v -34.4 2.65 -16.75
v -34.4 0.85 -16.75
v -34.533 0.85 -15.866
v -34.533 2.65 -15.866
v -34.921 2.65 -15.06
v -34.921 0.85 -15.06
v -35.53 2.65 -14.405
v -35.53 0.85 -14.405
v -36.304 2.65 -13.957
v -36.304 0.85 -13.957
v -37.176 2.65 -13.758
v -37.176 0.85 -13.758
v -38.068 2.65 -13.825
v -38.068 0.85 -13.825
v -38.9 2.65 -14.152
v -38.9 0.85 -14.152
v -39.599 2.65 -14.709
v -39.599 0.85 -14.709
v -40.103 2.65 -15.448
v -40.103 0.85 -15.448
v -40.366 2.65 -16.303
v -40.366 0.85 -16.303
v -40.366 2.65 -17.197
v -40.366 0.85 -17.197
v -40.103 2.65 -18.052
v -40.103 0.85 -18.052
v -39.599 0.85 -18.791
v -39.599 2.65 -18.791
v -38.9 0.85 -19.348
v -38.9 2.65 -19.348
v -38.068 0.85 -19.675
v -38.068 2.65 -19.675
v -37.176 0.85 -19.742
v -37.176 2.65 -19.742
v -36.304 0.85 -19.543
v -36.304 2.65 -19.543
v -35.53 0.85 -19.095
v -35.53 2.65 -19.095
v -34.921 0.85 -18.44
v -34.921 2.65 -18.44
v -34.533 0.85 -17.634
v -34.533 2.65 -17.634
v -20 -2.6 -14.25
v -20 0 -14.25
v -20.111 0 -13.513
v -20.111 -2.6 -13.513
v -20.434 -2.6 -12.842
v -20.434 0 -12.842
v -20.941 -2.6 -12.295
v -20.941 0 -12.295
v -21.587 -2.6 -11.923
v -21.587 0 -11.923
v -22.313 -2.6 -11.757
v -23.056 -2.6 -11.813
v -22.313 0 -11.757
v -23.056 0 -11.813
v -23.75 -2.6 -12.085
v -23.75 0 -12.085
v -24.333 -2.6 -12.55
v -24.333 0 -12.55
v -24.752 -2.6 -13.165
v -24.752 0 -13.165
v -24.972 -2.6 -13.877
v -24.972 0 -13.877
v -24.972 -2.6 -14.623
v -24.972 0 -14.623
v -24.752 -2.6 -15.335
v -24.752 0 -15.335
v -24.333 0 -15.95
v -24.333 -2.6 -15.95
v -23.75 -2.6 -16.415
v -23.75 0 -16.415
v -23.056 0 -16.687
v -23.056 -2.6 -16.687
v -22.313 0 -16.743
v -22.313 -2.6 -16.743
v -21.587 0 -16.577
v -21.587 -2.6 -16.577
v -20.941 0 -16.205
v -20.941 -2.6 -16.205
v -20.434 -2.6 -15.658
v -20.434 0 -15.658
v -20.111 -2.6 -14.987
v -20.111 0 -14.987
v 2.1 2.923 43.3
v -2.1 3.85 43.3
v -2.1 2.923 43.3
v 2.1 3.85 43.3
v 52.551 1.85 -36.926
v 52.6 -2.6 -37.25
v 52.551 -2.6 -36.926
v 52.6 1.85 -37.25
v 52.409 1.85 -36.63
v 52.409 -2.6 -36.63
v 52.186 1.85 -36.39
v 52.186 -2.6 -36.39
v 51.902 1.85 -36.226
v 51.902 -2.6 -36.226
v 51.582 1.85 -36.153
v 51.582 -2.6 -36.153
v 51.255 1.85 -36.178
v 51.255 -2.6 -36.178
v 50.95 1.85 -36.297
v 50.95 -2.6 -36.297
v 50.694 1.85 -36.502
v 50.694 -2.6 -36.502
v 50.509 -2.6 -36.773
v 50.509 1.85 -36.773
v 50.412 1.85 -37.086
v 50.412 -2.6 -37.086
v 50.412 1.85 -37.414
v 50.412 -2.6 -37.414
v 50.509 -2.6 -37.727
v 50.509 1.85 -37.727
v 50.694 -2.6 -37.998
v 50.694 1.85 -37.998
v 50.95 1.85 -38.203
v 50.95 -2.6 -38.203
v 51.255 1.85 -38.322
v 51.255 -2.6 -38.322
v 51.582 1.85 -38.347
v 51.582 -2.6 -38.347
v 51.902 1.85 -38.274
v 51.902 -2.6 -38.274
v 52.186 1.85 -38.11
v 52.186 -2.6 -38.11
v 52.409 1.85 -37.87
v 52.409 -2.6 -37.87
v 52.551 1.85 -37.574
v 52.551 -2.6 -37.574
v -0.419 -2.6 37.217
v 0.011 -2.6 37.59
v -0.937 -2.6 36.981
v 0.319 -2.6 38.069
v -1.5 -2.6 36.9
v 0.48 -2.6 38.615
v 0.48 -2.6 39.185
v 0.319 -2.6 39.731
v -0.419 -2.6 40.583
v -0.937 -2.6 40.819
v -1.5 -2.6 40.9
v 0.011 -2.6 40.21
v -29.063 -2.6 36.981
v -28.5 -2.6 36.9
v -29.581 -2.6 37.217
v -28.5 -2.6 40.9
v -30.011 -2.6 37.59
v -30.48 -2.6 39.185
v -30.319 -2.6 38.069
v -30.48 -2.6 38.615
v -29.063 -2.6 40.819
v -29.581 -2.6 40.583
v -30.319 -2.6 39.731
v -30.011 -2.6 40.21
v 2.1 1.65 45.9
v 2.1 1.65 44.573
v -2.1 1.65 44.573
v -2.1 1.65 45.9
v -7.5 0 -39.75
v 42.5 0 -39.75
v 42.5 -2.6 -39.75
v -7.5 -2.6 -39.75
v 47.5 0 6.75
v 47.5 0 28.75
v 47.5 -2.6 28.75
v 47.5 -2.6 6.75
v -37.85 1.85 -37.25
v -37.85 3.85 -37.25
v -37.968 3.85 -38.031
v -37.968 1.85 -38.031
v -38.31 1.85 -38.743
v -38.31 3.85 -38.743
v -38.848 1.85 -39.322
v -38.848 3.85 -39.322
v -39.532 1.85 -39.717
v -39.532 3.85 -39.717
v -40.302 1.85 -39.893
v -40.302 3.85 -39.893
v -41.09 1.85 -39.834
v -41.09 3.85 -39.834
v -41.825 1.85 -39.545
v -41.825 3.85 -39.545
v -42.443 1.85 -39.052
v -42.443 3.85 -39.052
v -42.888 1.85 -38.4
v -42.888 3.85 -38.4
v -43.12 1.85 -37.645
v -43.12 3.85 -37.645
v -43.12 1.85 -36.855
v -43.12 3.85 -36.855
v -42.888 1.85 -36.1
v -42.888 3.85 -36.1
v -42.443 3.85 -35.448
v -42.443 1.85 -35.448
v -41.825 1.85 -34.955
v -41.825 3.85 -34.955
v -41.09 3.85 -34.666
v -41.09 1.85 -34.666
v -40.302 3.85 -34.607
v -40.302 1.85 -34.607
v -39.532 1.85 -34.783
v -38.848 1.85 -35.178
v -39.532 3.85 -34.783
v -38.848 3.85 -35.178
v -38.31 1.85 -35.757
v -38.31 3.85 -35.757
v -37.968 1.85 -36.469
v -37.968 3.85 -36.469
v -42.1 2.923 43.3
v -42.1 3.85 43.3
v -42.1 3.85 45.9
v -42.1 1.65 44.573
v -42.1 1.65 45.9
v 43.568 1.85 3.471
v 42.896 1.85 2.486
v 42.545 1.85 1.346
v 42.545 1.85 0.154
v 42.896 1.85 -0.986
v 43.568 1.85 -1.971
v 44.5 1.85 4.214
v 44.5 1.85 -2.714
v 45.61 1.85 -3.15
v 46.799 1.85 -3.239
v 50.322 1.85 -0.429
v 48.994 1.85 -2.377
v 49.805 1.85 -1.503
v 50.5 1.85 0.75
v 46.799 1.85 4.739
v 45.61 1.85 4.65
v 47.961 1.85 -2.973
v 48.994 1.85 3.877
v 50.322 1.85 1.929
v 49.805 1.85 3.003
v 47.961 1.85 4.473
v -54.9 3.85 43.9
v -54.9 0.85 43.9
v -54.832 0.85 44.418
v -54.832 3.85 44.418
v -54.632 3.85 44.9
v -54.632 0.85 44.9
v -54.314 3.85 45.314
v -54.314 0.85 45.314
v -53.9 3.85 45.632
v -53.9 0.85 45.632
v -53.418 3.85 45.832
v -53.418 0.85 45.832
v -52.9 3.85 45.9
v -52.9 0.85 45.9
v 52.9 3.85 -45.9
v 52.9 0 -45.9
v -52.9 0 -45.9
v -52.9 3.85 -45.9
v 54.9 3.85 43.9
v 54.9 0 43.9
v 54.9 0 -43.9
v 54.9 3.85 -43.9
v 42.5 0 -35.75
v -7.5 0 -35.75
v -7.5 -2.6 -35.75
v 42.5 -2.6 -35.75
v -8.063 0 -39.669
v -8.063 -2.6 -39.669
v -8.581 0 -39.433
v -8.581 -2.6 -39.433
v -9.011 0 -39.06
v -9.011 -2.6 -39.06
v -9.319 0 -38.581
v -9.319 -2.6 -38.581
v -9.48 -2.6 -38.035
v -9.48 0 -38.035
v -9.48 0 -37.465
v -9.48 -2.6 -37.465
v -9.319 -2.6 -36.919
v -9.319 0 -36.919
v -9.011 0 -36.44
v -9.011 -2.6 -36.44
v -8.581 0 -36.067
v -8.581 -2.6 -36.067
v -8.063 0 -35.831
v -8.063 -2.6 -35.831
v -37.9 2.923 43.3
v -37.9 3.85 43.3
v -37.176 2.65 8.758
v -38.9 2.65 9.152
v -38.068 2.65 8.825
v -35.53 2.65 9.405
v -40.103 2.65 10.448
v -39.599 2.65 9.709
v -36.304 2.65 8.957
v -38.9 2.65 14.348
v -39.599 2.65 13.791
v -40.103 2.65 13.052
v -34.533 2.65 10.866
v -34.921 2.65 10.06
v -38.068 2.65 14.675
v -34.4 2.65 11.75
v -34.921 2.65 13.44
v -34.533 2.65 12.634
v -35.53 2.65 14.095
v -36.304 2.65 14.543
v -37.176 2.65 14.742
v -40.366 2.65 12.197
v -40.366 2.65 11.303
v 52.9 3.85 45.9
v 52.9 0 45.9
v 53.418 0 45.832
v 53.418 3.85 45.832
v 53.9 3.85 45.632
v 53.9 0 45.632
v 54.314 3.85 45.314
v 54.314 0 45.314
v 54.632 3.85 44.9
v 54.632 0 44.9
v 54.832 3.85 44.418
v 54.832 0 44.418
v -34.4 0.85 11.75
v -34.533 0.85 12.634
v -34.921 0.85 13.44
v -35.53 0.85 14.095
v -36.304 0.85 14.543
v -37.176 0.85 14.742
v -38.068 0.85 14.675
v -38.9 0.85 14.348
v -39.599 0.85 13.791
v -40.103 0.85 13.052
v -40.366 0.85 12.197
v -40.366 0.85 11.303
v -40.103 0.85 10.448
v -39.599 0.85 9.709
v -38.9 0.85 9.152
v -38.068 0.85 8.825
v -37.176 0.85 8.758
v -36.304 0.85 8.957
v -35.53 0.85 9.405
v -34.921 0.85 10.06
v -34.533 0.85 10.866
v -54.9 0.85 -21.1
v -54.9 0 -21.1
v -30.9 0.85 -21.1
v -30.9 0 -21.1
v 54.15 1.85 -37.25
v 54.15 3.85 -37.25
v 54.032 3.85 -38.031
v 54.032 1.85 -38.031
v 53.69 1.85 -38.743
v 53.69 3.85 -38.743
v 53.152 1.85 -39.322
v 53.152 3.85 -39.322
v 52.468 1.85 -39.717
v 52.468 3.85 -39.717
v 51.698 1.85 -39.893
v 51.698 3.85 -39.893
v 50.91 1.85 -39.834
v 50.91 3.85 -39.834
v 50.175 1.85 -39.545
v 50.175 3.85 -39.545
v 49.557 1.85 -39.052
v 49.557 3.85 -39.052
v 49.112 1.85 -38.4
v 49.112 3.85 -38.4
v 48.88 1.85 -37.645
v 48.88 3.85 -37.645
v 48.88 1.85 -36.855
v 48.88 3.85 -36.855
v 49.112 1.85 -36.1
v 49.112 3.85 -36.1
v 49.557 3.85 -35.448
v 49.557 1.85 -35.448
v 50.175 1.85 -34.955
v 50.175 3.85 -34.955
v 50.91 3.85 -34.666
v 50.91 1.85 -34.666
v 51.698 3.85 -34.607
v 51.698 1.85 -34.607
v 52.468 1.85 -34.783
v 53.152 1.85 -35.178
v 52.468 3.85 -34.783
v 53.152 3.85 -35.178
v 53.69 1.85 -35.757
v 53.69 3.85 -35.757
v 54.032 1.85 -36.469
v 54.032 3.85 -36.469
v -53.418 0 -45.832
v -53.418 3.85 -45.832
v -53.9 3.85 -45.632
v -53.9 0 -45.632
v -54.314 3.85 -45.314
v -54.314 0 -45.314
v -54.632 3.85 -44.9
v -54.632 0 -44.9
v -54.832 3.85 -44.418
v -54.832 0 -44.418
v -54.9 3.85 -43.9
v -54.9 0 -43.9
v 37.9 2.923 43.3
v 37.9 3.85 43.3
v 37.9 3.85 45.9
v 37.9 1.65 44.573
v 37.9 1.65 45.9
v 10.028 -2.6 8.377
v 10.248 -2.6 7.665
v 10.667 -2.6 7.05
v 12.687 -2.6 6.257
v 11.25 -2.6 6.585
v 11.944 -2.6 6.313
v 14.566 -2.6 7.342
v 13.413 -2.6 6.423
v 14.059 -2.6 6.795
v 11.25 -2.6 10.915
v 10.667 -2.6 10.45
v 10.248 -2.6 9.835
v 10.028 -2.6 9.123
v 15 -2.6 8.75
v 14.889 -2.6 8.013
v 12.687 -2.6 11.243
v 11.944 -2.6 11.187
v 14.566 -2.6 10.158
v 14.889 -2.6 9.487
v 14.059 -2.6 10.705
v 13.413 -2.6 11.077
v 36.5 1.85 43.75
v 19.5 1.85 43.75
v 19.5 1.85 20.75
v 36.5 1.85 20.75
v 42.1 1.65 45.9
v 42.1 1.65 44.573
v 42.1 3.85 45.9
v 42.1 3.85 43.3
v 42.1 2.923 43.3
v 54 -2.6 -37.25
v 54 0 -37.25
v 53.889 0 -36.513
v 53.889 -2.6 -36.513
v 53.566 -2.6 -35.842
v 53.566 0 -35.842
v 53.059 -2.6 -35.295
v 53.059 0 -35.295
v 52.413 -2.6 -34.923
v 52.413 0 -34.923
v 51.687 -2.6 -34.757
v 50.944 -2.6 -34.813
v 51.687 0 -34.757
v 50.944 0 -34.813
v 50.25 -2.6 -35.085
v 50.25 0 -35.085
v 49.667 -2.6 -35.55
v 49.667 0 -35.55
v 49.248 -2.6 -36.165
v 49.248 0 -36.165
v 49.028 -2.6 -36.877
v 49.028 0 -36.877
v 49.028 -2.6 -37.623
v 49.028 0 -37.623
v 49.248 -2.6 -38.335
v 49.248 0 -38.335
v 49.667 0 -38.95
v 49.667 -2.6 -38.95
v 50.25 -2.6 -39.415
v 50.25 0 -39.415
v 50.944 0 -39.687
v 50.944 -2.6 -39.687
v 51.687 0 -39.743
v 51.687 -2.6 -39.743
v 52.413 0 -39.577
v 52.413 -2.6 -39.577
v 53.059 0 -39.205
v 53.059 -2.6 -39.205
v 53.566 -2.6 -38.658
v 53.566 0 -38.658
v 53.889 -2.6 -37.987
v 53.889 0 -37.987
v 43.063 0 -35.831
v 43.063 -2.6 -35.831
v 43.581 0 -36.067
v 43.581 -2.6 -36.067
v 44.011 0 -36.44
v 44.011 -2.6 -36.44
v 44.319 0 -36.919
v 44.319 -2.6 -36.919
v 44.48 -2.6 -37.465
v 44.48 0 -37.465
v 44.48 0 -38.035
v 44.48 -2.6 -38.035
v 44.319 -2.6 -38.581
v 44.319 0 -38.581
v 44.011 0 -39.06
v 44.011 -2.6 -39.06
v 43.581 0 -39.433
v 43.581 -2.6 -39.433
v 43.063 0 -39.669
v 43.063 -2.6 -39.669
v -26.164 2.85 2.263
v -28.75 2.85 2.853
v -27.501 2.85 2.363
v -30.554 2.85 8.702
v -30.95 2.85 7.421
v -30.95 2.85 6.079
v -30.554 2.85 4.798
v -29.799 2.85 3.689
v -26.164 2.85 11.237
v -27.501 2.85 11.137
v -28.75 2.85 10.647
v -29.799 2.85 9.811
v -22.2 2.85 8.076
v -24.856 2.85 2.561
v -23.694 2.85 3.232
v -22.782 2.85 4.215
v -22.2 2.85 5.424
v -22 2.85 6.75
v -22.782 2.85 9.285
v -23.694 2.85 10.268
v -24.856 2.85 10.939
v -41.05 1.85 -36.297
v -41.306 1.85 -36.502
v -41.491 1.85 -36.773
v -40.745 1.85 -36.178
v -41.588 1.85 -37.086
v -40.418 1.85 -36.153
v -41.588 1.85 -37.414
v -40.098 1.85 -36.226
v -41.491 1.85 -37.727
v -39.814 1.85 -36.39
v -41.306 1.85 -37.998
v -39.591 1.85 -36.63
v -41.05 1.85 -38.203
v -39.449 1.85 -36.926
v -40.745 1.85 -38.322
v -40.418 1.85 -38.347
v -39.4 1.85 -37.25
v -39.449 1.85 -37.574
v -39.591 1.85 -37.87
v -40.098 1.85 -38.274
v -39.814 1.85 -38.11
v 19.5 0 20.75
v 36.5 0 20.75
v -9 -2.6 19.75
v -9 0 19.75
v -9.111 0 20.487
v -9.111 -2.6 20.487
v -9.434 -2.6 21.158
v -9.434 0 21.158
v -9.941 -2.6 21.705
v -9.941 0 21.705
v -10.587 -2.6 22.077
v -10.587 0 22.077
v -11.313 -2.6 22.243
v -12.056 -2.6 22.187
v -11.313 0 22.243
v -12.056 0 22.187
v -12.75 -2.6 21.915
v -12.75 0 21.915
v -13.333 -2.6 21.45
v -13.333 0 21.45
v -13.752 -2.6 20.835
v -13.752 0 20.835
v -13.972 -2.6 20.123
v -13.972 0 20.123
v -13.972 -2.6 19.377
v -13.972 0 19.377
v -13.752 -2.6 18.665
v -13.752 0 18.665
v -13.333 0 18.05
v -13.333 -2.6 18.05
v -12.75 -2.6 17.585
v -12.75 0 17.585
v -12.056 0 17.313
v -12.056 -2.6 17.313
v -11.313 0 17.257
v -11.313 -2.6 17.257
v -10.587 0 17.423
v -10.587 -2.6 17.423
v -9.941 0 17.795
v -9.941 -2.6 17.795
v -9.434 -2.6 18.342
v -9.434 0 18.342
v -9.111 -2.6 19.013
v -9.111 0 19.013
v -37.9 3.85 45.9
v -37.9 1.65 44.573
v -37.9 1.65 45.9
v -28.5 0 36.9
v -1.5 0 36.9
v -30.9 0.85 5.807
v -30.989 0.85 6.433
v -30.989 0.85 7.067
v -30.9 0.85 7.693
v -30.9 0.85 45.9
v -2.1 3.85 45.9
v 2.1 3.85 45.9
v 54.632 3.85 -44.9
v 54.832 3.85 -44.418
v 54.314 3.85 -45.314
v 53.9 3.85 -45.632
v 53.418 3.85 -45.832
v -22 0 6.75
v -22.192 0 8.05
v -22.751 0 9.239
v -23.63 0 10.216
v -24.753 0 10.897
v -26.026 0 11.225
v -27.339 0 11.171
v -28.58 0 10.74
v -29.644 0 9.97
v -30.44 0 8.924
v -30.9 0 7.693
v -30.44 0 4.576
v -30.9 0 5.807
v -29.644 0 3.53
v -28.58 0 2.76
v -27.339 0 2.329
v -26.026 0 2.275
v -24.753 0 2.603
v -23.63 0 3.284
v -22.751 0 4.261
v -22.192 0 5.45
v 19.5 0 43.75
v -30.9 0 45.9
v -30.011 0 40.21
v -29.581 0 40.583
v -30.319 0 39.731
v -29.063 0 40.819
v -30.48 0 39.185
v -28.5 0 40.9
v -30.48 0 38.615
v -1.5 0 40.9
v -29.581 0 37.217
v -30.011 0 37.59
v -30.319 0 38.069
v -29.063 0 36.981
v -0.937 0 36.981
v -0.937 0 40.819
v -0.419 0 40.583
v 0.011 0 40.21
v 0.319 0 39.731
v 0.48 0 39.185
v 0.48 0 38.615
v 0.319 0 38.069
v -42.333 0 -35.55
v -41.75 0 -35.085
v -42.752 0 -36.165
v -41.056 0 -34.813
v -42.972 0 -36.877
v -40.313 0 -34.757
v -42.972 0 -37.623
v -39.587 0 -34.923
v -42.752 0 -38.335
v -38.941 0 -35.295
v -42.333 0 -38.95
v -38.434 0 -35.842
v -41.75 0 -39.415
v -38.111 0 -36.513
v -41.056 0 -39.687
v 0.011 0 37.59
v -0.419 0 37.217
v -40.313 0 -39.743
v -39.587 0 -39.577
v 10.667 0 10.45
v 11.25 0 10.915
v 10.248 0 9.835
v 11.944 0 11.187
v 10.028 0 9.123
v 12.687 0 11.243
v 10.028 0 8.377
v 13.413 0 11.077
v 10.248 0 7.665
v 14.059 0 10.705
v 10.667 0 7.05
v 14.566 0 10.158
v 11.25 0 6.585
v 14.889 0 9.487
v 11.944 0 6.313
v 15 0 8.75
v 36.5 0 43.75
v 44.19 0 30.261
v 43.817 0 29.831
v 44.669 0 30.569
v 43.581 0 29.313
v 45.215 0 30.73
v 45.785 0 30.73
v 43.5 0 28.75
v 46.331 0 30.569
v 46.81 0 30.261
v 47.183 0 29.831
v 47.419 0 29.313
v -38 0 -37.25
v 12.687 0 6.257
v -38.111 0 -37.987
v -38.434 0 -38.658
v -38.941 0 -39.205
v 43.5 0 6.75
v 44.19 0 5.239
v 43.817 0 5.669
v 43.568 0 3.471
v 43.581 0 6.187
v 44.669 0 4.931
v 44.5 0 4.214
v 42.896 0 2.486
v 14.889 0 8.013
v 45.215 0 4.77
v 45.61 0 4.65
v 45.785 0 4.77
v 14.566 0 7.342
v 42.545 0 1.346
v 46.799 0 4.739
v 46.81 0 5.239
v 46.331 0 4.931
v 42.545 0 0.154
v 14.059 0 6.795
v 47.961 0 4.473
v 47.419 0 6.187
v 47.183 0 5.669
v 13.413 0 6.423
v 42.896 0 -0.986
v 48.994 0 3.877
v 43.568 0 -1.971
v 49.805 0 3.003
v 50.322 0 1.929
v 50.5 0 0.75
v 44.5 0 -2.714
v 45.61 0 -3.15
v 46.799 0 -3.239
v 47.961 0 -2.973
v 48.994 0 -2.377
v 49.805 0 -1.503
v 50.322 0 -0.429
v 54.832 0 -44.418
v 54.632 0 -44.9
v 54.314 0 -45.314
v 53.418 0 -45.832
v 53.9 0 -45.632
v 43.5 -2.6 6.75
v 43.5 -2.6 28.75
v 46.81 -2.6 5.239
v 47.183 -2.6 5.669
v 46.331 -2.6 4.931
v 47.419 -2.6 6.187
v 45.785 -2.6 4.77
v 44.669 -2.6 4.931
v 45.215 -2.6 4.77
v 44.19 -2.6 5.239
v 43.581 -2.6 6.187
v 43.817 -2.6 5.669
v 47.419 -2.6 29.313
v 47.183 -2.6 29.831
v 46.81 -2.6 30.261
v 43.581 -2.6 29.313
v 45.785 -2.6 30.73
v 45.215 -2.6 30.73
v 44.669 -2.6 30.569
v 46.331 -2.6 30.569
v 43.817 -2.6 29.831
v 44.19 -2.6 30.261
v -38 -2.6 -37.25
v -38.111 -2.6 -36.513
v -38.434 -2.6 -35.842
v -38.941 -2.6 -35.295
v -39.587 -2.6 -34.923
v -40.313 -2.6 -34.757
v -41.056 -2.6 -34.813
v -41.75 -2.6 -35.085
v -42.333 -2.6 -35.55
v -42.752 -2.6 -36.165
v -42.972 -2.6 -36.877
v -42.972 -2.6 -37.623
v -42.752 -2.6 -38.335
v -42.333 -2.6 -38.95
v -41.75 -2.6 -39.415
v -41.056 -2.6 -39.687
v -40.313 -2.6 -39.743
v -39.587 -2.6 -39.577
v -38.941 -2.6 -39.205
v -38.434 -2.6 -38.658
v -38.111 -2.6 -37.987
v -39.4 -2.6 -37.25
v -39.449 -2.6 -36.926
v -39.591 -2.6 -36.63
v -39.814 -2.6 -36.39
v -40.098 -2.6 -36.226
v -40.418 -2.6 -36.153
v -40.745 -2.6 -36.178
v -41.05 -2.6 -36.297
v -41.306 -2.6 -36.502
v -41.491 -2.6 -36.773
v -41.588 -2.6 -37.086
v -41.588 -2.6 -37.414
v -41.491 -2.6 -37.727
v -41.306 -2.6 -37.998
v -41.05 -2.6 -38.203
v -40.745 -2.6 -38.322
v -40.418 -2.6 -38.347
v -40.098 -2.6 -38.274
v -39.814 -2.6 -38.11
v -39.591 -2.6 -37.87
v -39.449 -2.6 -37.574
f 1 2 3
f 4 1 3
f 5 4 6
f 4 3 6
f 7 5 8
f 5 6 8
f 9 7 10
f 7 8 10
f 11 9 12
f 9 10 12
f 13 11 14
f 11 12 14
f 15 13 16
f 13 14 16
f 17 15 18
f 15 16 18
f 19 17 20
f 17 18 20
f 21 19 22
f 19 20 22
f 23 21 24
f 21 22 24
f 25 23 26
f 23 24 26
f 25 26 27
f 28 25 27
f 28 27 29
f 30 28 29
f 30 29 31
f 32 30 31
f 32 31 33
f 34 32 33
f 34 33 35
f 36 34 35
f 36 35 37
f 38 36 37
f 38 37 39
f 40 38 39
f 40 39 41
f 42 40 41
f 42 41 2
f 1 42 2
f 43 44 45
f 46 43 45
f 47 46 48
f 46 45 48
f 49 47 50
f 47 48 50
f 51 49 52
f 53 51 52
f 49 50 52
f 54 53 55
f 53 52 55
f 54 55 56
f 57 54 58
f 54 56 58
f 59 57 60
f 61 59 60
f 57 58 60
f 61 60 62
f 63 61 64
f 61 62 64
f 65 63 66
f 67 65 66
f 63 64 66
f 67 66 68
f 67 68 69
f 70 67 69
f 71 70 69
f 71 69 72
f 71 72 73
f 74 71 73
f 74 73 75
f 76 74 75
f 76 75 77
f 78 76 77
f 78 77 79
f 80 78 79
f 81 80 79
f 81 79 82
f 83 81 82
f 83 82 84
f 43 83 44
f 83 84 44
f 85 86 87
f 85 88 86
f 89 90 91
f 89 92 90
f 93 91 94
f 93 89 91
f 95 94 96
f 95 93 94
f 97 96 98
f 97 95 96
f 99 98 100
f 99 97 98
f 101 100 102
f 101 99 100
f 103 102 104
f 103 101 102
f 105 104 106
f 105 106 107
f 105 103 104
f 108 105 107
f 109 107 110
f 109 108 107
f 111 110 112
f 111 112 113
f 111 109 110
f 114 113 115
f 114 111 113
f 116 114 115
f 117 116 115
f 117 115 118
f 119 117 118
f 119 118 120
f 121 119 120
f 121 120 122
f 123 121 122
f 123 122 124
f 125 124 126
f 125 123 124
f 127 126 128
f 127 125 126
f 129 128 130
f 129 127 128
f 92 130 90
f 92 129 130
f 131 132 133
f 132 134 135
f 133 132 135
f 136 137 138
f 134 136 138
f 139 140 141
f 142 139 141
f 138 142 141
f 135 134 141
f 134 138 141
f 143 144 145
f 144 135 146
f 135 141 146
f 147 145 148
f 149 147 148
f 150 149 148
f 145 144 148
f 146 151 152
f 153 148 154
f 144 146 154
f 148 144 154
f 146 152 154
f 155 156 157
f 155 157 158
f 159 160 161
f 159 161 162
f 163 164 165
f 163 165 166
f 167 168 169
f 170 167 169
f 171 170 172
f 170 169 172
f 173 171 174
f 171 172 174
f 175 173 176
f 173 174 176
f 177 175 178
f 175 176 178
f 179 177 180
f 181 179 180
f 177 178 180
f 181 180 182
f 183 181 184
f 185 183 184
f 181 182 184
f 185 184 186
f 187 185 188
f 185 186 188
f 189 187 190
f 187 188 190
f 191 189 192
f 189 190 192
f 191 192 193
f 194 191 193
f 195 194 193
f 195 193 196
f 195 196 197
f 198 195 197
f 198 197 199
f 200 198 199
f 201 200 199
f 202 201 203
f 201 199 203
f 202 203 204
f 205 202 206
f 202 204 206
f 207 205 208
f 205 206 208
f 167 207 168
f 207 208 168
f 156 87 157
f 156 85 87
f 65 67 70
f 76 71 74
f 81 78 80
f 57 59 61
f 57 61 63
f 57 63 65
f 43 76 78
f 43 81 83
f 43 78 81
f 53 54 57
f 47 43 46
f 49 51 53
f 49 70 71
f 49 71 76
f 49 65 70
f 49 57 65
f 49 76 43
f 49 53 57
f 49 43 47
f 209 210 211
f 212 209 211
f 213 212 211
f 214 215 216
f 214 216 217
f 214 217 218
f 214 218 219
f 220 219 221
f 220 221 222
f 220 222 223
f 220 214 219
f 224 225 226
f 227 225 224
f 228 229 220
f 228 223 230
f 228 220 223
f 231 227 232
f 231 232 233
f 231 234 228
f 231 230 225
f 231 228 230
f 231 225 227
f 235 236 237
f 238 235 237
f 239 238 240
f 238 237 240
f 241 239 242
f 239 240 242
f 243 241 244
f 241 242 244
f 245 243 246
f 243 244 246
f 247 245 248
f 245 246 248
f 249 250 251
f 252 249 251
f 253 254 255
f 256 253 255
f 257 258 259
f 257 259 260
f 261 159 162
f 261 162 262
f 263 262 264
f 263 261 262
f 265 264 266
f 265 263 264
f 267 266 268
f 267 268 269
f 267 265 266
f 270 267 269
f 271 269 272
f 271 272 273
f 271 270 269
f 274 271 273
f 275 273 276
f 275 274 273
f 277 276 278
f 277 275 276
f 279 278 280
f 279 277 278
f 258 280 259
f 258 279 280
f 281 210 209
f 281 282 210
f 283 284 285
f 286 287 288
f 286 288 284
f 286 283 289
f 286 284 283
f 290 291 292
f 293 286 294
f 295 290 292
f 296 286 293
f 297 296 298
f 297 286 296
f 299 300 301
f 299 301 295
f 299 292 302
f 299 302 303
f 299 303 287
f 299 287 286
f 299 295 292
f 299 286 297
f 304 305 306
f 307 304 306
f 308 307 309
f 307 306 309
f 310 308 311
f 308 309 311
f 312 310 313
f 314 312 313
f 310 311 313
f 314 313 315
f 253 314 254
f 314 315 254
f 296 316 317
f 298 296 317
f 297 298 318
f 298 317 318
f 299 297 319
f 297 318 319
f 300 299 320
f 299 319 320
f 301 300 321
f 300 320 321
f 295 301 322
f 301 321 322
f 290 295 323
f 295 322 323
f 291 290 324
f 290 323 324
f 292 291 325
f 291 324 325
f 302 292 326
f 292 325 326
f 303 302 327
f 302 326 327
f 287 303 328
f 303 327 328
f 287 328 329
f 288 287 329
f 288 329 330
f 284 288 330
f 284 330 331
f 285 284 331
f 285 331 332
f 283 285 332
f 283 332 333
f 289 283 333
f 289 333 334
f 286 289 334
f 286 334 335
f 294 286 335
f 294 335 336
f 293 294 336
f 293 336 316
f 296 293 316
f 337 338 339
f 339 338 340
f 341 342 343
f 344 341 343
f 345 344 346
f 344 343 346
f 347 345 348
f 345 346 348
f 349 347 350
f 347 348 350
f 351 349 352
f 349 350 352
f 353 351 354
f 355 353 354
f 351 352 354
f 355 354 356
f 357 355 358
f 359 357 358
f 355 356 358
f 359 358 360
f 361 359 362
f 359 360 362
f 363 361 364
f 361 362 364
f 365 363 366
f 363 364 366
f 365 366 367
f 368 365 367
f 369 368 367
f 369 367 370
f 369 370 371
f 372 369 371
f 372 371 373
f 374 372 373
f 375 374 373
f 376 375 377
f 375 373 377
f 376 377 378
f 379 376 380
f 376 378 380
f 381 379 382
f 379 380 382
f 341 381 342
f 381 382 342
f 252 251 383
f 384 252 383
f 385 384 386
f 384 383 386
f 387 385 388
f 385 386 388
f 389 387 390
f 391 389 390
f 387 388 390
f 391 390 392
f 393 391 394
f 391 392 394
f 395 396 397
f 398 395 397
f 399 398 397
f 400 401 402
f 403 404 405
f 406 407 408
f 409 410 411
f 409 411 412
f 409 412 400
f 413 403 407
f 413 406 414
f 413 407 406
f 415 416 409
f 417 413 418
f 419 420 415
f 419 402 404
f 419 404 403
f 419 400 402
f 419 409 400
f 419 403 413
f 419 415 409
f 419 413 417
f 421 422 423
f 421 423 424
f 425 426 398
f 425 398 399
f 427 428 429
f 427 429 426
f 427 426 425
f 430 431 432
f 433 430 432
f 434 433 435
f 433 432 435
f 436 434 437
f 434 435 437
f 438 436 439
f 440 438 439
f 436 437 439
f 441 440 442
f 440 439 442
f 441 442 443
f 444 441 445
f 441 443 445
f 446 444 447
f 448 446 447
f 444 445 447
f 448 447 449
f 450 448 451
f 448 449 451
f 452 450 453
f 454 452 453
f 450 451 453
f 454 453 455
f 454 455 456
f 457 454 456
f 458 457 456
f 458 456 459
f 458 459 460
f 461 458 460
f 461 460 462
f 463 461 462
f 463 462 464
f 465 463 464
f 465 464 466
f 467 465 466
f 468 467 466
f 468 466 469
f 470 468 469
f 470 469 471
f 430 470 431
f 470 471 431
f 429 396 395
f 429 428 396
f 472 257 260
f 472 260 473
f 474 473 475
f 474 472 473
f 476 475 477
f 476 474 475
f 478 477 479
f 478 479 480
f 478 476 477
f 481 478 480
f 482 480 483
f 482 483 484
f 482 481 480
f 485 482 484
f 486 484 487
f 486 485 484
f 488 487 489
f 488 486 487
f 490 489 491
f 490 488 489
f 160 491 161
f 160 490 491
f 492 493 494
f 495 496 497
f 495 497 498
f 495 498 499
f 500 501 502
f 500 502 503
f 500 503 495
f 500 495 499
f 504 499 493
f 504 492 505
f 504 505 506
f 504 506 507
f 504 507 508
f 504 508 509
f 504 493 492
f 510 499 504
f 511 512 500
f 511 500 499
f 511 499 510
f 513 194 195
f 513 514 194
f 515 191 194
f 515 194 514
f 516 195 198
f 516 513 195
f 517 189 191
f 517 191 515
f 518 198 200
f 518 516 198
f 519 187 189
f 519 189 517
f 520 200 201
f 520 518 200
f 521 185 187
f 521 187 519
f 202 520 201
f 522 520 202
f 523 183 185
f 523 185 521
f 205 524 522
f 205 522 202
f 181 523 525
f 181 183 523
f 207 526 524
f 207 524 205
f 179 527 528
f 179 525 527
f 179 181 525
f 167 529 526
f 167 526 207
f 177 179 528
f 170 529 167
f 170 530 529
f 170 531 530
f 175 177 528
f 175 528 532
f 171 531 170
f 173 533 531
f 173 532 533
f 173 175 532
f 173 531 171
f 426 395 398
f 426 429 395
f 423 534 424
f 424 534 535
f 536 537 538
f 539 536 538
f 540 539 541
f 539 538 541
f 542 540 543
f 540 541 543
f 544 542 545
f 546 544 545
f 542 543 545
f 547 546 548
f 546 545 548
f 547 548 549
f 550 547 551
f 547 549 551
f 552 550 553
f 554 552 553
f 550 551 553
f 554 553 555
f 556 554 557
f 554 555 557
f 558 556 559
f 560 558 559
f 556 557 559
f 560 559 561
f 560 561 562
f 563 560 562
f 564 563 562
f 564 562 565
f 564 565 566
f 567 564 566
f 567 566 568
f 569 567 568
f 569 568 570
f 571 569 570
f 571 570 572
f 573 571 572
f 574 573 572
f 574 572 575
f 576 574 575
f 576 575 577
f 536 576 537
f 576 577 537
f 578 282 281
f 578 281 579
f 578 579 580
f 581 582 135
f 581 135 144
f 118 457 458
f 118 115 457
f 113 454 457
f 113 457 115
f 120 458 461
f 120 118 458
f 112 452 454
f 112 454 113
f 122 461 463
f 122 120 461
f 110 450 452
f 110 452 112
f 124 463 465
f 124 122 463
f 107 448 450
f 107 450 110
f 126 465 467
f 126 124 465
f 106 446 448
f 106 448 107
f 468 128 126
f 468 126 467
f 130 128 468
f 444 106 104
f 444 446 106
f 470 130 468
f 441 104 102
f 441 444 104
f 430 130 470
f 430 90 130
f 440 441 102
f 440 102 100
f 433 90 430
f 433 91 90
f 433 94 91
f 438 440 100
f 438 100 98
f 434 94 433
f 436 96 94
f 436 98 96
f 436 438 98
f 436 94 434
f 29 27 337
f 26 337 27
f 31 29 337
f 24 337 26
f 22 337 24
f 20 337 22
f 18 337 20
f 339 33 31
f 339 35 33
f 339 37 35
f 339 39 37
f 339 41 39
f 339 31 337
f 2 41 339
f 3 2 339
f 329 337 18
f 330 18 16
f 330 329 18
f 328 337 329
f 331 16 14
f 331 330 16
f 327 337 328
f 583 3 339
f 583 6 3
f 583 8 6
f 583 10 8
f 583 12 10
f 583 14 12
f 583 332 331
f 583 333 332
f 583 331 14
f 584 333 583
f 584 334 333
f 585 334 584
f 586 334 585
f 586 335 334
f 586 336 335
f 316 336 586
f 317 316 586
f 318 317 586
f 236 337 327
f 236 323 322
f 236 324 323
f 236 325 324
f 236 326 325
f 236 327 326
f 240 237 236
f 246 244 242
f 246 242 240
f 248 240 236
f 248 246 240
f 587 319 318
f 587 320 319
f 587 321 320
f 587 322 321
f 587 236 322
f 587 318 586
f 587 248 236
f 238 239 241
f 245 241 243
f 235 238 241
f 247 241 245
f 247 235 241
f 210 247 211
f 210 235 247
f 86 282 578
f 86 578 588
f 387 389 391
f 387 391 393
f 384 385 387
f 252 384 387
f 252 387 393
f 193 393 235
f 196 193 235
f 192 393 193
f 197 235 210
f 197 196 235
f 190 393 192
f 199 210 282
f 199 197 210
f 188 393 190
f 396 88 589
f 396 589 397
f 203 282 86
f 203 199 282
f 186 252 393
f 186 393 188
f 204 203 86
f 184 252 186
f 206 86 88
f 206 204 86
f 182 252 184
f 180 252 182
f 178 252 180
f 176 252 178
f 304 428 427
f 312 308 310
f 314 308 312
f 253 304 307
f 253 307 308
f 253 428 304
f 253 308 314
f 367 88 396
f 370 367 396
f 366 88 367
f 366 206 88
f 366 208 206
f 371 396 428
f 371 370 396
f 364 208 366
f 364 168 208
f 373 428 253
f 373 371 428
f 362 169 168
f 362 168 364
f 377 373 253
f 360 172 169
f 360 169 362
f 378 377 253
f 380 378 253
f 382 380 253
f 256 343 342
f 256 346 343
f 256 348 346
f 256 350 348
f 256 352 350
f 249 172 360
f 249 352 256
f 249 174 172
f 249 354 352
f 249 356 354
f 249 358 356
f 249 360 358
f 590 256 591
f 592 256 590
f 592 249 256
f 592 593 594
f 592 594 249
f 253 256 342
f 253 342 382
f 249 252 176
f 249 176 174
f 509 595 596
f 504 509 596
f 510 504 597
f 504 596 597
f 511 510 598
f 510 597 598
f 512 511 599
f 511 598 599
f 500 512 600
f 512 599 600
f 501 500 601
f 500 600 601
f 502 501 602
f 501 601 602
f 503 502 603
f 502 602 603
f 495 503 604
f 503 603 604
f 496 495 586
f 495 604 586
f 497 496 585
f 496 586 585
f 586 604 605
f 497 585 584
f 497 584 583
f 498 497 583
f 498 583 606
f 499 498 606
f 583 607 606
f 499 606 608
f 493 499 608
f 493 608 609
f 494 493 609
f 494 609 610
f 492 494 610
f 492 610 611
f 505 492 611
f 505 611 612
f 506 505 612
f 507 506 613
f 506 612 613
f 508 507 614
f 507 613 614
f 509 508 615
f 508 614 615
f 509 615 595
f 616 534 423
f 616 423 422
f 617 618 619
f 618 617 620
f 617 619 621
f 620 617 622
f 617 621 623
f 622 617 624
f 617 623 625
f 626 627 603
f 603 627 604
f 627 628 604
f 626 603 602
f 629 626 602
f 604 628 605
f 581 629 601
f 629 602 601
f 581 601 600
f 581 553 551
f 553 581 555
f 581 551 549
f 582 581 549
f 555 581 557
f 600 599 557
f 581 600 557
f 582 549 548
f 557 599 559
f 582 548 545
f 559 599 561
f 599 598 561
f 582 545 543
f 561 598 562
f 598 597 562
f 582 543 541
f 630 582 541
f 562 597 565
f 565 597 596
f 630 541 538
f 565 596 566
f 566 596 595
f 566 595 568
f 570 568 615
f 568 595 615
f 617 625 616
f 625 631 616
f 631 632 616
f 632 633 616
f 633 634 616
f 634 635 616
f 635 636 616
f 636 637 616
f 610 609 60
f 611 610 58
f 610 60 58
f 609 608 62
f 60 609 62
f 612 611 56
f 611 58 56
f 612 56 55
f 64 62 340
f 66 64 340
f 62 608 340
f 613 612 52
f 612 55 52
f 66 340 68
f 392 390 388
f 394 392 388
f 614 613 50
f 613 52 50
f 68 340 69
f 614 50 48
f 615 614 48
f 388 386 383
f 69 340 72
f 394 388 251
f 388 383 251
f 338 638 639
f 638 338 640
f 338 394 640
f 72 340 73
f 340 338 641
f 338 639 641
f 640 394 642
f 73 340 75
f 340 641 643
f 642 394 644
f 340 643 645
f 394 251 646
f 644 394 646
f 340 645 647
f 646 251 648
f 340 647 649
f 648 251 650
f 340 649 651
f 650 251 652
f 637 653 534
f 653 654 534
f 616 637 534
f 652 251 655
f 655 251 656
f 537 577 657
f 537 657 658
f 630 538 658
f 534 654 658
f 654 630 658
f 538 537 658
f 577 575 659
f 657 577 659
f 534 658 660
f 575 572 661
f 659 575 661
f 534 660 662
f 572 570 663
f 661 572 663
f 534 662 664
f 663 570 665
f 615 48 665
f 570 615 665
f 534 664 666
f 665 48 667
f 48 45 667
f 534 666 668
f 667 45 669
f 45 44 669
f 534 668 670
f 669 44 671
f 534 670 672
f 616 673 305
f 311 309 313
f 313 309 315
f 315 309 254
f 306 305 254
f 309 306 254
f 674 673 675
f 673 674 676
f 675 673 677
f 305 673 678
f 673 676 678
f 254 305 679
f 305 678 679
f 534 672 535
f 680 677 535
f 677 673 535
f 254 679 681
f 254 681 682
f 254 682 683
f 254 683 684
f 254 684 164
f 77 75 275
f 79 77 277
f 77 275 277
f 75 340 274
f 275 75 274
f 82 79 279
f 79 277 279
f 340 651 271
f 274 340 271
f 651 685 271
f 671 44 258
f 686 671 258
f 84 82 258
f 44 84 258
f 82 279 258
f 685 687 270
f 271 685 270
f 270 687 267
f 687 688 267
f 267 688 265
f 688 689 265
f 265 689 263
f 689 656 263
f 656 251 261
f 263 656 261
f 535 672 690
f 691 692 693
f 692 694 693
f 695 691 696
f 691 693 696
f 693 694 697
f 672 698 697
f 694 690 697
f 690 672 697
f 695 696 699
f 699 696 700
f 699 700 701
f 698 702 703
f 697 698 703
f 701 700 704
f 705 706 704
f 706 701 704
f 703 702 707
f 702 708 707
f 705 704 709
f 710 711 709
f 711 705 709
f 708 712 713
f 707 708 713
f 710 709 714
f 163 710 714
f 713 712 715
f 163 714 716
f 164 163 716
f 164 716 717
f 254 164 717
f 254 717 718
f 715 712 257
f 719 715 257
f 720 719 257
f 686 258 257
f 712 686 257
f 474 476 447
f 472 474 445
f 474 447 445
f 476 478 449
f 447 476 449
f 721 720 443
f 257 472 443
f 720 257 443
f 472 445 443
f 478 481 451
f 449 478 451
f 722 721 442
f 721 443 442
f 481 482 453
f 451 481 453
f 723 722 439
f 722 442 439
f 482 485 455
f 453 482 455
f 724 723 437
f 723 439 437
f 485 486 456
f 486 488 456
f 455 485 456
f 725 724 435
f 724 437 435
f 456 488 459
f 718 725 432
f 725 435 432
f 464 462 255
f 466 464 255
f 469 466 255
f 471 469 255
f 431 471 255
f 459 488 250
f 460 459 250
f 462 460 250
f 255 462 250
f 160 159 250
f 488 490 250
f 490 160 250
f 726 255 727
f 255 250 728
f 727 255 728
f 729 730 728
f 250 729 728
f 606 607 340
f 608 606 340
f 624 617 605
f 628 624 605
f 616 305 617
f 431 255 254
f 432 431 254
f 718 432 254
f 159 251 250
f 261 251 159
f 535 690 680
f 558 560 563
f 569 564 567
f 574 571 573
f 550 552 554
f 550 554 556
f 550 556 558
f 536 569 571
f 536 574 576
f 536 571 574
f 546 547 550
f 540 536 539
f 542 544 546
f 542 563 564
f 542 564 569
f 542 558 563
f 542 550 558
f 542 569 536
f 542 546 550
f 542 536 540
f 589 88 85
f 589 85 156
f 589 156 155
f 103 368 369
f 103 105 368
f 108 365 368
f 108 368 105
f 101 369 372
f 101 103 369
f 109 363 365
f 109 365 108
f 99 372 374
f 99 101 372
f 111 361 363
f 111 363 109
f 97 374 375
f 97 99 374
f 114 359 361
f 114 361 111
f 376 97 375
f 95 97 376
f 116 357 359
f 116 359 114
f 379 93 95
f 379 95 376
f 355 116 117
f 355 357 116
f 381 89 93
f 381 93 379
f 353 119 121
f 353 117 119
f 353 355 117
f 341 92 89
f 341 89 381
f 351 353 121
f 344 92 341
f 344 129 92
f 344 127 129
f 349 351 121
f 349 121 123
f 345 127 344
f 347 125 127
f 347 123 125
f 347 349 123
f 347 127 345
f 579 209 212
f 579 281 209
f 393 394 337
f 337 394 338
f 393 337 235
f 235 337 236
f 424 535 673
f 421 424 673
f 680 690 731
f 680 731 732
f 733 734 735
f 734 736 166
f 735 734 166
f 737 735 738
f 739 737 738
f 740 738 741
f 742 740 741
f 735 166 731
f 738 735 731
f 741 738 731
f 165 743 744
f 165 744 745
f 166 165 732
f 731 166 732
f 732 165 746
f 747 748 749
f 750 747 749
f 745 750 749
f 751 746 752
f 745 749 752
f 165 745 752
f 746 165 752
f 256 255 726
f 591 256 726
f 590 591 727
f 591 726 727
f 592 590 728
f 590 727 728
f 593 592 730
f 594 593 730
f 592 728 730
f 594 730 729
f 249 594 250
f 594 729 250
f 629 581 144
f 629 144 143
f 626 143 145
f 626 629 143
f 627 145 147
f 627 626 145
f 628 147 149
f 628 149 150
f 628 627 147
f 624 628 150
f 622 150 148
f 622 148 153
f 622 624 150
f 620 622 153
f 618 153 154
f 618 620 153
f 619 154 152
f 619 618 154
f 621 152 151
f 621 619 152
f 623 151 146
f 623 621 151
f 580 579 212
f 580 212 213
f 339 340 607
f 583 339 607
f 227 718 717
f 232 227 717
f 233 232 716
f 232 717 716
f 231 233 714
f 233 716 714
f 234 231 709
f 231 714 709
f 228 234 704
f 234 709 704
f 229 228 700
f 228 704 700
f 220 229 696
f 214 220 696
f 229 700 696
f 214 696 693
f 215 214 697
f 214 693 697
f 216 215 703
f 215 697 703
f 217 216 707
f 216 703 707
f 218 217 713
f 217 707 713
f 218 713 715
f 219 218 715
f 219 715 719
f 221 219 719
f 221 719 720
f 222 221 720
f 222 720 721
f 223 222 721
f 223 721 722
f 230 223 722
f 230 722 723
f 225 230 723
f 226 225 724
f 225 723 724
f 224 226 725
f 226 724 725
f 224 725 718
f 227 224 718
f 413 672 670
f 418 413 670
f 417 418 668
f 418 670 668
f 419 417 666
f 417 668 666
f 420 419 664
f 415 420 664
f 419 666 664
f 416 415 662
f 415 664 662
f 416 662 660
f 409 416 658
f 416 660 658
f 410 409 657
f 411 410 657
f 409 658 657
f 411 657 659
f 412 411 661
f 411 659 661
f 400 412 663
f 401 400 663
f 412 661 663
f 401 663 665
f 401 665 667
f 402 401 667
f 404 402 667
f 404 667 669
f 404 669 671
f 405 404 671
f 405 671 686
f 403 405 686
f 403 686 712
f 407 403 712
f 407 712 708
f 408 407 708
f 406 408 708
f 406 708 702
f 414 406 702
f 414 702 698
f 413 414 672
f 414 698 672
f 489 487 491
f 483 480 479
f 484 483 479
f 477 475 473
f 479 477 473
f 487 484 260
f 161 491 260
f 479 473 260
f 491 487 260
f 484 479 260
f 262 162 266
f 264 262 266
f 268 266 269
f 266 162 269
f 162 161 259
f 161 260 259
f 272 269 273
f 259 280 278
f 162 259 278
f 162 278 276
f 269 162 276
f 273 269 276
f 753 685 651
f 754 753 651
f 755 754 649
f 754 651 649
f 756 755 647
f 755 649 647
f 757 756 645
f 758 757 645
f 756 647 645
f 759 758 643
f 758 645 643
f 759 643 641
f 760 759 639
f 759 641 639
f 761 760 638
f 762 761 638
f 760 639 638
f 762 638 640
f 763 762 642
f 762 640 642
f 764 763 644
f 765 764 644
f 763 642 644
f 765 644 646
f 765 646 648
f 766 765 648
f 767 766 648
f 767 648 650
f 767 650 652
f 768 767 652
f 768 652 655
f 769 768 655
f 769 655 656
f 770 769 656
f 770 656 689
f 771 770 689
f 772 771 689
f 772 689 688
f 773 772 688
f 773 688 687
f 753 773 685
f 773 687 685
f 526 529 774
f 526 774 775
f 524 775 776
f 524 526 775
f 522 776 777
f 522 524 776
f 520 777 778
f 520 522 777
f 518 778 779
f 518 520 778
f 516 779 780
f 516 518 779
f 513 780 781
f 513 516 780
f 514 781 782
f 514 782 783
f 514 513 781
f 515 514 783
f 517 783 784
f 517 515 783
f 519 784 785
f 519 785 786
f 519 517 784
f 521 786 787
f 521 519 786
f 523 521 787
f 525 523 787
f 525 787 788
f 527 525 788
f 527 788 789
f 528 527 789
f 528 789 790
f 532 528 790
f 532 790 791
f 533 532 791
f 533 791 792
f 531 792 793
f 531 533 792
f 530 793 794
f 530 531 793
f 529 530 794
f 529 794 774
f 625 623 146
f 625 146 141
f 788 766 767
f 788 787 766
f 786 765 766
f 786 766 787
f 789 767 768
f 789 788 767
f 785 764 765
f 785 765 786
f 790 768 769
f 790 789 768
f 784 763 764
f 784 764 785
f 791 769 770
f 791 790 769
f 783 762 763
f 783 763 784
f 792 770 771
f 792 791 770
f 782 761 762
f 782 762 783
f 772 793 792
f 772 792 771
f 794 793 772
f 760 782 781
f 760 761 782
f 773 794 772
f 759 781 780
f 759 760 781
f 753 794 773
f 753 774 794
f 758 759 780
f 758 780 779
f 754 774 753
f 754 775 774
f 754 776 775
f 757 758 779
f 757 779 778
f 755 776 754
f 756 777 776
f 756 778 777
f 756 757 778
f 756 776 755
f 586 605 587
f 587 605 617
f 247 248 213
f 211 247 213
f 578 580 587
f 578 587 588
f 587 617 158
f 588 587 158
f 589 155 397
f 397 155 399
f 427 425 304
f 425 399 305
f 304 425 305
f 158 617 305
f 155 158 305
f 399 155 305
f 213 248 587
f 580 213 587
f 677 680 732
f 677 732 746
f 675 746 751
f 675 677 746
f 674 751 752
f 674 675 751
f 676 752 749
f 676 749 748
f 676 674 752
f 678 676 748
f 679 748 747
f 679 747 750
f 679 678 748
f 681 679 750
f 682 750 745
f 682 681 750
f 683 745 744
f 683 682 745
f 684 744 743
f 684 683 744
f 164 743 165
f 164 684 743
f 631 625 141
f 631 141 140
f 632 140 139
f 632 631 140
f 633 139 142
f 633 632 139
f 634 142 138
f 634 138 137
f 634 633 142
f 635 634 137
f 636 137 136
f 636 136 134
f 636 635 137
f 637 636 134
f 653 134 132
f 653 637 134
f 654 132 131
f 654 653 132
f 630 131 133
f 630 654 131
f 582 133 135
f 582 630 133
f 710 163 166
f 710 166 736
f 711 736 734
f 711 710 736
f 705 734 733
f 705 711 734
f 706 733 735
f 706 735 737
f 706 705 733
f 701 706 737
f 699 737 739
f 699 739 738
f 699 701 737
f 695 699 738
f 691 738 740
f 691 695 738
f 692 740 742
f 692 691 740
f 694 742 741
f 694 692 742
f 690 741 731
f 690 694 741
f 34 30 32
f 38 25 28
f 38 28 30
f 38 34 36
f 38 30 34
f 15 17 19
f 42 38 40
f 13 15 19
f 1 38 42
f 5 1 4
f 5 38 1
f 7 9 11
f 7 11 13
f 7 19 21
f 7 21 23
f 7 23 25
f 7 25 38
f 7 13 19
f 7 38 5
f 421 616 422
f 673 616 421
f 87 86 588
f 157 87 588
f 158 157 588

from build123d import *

# Parameters (mm, degrees)
EXTRUDE_1_DEPTH        = 3.85
SKETCH_2_R             = 1.1
CUT_EXTRUDE_1_DEPTH    = 4.85
CUT_EXTRUDE_2_DEPTH    = 2.1
PATTERN_LINEAR_1_COUNT = 2
PATTERN_LINEAR_1_PITCH = 40
PATTERN_LINEAR_2_COUNT = 2
PATTERN_LINEAR_2_PITCH = 40
SKETCH_7_R             = 2.5
SKETCH_7_R_2           = 1.1
EXTRUDE_2_DEPTH        = 2.6
SKETCH_8_R             = 2.65
CUT_EXTRUDE_5_DEPTH    = 2
SKETCH_5_W             = 17
SKETCH_5_H             = 23
CUT_EXTRUDE_3_DEPTH    = 1.85
SKETCH_6_R             = 4
CUT_EXTRUDE_4_DEPTH    = 1.85
SKETCH_9_W             = 24
SKETCH_9_H             = 67
CUT_EXTRUDE_6_DEPTH    = 0.85
SKETCH_10_R            = 3
CUT_EXTRUDE_7_DEPTH    = 2.65
SKETCH_11_R            = 4.5
CUT_EXTRUDE_8_DEPTH    = 2.85


with BuildPart() as part:
    # 草图1 → 凸台-拉伸1 (new body)
    with BuildSketch(Plane(origin=(0, 0, 0), x_dir=(1, 0, 0), z_dir=(0, 1, 0))):
        with BuildLine():
            Line((-52.9, -45.9), (52.9, -45.9))
            ThreePointArc((52.9, -45.9), (54.314213562, -45.314213562), (54.9, -43.9))
            Line((54.9, -43.9), (54.9, 43.9))
            ThreePointArc((54.9, 43.9), (54.314213562, 45.314213562), (52.9, 45.9))
            Line((52.9, 45.9), (-52.9, 45.9))
            ThreePointArc((-52.9, 45.9), (-54.314213562, 45.314213562), (-54.9, 43.9))
            Line((-54.9, 43.9), (-54.9, -43.9))
            ThreePointArc((-54.9, -43.9), (-54.314213562, -45.314213562), (-52.9, -45.9))
        make_face()
    extrude(amount=EXTRUDE_1_DEPTH)

    # 草图2 → 切除-拉伸1 (cut, through all)
    with BuildSketch(Plane(origin=(0, 3.85, 0), x_dir=(1, 0, 0), z_dir=(0, 1, 0))):
        with Locations((-40.5, 37.25)):
            Circle(SKETCH_2_R)
        with Locations((51.5, 37.25)):
            Circle(SKETCH_2_R)
    extrude(amount=-CUT_EXTRUDE_1_DEPTH, mode=Mode.SUBTRACT)

    # 草图3 → 切除-拉伸2 (cut, symmetric)
    with BuildSketch(Plane(origin=(0, 0, 0), x_dir=(0, 0, -1), z_dir=(1, 0, 0))):
        Polygon((-45.9, 3.85), (-43.3, 3.85), (-43.3, 2.922792206), (-44.572792206, 1.65), (-45.9, 1.65), align=None)
    cut_extrude_2 = extrude(amount=CUT_EXTRUDE_2_DEPTH, both=True, mode=Mode.SUBTRACT)

    # 阵列(线性)1: 切除-拉伸2 ×2
    with Locations(*[(i * PATTERN_LINEAR_1_PITCH, 0, 0) for i in range(1, PATTERN_LINEAR_1_COUNT)]):
        add(cut_extrude_2, mode=Mode.SUBTRACT)

    # 阵列(线性)2: 切除-拉伸2 ×2
    with Locations(*[(-i * PATTERN_LINEAR_2_PITCH, 0, 0) for i in range(1, PATTERN_LINEAR_2_COUNT)]):
        add(cut_extrude_2, mode=Mode.SUBTRACT)

    # 草图7 → 凸台-拉伸2 (add)
    with BuildSketch(Plane.XZ):
        with Locations((-40.5, -37.25)):
            Circle(SKETCH_7_R)
        with Locations((-40.5, -37.25)):
            Circle(SKETCH_7_R_2, mode=Mode.SUBTRACT)
        with Locations((51.5, -37.25)):
            Circle(SKETCH_7_R)
        with Locations((51.5, -37.25)):
            Circle(SKETCH_7_R_2, mode=Mode.SUBTRACT)
        with Locations((-11.5, 19.75)):
            Circle(SKETCH_7_R)
        with Locations((-22.5, -14.25)):
            Circle(SKETCH_7_R)
        with Locations((12.5, 8.75)):
            Circle(SKETCH_7_R)
        with BuildLine():
            Line((-28.5, 40.9), (-1.5, 40.9))
            ThreePointArc((-1.5, 40.9), (0.5, 38.9), (-1.5, 36.9))
            Line((-1.5, 36.9), (-28.5, 36.9))
            ThreePointArc((-28.5, 36.9), (-30.5, 38.9), (-28.5, 40.9))
        make_face()
        with BuildLine():
            Line((47.5, 28.75), (47.5, 6.75))
            ThreePointArc((47.5, 6.75), (45.5, 4.75), (43.5, 6.75))
            Line((43.5, 6.75), (43.5, 28.75))
            ThreePointArc((43.5, 28.75), (45.5, 30.75), (47.5, 28.75))
        make_face()
        with BuildLine():
            Line((-7.5, -35.75), (42.5, -35.75))
            ThreePointArc((42.5, -35.75), (44.5, -37.75), (42.5, -39.75))
            Line((42.5, -39.75), (-7.5, -39.75))
            ThreePointArc((-7.5, -39.75), (-9.5, -37.75), (-7.5, -35.75))
        make_face()
    extrude(amount=EXTRUDE_2_DEPTH)

    # 草图8 → 切除-拉伸5 (cut)
    with BuildSketch(Plane(origin=(0, 3.85, 0), x_dir=(1, 0, 0), z_dir=(0, 1, 0))):
        with Locations((-40.5, 37.25)):
            Circle(SKETCH_8_R)
        with Locations((51.5, 37.25)):
            Circle(SKETCH_8_R)
    extrude(amount=-CUT_EXTRUDE_5_DEPTH, mode=Mode.SUBTRACT)

    # 草图5 → 切除-拉伸3 (cut)
    with BuildSketch(Plane.XZ):
        with Locations((28, 32.25)):
            Rectangle(SKETCH_5_W, SKETCH_5_H)
    extrude(amount=-CUT_EXTRUDE_3_DEPTH, mode=Mode.SUBTRACT)

    # 草图6 → 切除-拉伸4 (cut)
    with BuildSketch(Plane.XZ):
        with Locations((46.5, 0.75)):
            Circle(SKETCH_6_R)
    extrude(amount=-CUT_EXTRUDE_4_DEPTH, mode=Mode.SUBTRACT)

    # 草图9 → 切除-拉伸6 (cut)
    with BuildSketch(Plane.XZ):
        with Locations((-42.9, 12.4)):
            Rectangle(SKETCH_9_W, SKETCH_9_H)
    extrude(amount=-CUT_EXTRUDE_6_DEPTH, mode=Mode.SUBTRACT)

    # 草图10 → 切除-拉伸7 (cut)
    with BuildSketch(Plane.XZ):
        with Locations((-37.4, 11.75)):
            Circle(SKETCH_10_R)
        with Locations((-37.4, -16.75)):
            Circle(SKETCH_10_R)
    extrude(amount=-CUT_EXTRUDE_7_DEPTH, mode=Mode.SUBTRACT)

    # 草图11 → 切除-拉伸8 (cut)
    with BuildSketch(Plane.XZ):
        with Locations((-26.5, 6.75)):
            Circle(SKETCH_11_R)
    extrude(amount=-CUT_EXTRUDE_8_DEPTH, mode=Mode.SUBTRACT)


solid = part.part
